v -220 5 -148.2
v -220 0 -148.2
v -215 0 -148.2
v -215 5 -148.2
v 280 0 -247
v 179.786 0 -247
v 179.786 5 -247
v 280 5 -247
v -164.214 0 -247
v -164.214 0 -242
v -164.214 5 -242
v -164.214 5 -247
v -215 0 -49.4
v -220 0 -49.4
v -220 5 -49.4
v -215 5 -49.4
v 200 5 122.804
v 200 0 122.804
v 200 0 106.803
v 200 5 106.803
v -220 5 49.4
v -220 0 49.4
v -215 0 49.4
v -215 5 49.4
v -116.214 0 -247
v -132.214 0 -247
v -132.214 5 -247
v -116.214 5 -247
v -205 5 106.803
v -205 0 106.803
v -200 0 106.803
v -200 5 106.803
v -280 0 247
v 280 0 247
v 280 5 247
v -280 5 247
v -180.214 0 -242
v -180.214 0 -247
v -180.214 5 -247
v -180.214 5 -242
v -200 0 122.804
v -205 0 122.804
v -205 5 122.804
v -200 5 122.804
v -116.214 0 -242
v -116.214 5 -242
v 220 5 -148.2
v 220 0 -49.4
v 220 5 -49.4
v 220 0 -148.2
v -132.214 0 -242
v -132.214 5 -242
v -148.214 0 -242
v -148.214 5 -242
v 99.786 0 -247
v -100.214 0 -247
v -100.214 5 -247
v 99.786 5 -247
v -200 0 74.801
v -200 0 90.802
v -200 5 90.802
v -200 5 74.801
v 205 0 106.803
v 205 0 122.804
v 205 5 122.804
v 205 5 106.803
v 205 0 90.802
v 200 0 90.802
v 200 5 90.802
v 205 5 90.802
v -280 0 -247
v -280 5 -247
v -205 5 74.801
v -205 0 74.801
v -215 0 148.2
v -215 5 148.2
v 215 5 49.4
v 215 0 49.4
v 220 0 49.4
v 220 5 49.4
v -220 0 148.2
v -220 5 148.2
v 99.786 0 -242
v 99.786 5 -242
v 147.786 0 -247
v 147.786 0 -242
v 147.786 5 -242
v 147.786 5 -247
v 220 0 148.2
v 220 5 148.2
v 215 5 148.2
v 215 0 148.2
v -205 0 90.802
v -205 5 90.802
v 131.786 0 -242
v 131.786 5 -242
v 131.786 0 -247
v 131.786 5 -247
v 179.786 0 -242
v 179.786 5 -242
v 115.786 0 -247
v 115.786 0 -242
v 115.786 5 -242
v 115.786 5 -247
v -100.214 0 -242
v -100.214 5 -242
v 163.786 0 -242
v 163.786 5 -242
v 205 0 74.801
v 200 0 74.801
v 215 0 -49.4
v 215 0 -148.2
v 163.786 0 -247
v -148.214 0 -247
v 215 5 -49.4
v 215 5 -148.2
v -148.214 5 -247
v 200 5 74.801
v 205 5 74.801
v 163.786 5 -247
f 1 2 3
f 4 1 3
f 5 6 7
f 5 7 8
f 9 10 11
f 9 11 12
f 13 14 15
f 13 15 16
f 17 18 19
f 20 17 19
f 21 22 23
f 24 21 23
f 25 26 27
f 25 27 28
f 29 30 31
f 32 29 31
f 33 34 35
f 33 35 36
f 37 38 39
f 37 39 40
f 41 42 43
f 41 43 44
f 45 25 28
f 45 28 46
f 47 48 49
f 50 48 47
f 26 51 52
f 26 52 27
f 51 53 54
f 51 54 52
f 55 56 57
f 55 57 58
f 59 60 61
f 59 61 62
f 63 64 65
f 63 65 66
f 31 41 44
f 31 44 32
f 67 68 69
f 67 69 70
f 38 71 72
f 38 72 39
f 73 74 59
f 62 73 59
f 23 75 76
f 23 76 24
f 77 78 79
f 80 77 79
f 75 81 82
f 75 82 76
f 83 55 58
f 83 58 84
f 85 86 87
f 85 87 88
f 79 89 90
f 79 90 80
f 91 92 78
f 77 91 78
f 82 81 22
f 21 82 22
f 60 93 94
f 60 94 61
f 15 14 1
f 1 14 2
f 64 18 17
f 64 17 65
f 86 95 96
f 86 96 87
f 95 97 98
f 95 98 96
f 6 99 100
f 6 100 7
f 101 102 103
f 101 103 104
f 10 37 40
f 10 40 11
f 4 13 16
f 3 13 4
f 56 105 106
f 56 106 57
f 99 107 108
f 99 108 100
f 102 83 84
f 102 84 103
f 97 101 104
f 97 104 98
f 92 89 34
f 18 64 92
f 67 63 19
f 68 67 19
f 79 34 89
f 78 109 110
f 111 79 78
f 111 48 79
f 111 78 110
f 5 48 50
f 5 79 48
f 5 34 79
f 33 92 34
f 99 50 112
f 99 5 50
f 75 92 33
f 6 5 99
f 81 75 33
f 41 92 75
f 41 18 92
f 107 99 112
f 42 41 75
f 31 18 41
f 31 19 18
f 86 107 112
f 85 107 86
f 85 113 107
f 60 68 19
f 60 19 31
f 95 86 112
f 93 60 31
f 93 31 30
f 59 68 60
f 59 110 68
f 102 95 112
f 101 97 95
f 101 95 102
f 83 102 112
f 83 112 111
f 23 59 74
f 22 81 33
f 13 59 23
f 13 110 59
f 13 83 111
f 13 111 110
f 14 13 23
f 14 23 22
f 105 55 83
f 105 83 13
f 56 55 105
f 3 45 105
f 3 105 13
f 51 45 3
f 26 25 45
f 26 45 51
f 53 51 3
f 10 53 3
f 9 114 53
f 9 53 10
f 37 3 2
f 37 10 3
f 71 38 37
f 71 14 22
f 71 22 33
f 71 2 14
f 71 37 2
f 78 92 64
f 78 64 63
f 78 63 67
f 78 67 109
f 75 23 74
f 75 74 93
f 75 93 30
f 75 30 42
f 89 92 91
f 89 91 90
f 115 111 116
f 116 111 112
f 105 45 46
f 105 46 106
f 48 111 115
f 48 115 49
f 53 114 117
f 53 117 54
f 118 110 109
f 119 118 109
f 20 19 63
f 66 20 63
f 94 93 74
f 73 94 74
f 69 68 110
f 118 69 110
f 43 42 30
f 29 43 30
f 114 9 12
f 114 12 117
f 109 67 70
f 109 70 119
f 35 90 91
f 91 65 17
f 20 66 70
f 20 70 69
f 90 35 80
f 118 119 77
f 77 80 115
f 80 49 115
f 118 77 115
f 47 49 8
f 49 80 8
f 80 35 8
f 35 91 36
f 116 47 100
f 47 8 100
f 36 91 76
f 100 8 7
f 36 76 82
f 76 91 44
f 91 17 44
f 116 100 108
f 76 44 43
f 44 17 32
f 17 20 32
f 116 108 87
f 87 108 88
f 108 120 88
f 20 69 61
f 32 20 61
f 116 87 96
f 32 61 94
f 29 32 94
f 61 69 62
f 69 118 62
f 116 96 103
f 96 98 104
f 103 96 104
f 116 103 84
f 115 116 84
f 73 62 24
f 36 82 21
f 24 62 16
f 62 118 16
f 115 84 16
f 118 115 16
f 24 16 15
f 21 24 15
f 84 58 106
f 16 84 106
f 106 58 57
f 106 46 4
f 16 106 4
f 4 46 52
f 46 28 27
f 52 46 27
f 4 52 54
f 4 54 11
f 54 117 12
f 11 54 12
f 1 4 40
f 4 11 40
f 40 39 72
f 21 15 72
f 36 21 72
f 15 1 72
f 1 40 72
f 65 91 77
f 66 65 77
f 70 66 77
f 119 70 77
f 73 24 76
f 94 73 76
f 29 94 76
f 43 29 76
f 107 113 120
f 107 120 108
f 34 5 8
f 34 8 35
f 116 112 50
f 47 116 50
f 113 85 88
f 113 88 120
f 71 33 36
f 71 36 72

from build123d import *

# Parameters (mm, degrees)
SKETCH1_W           = 5
SKETCH1_H           = 98.8
SKETCH1_H_2         = 16.000962119
BOSS_EXTRUDE1_DEPTH = 5


with BuildPart() as part:
    # Sketch1 → Boss-Extrude1 (new body)
    with BuildSketch(Plane(origin=(0, 0, 0), x_dir=(1, 0, 0), z_dir=(0, 1, 0))):
        Polygon((-280, 247), (-180.213569057, 247), (-180.213569057, 242), (-164.213569057, 242), (-164.213569057, 247), (-148.213569057, 247), (-148.213569057, 242), (-132.213569057, 242), (-132.213569057, 247), (-116.213569057, 247), (-116.213569057, 242), (-100.213569057, 242), (-100.213569057, 247), (99.786430943, 247), (99.786430943, 242), (115.786430943, 242), (115.786430943, 247), (131.786430943, 247), (131.786430943, 242), (147.786430943, 242), (147.786430943, 247), (163.786430943, 247), (163.786430943, 242), (179.786430943, 242), (179.786430943, 247), (280, 247), (280, -247), (-280, -247), align=None)
        with Locations((-217.5, -98.8)):
            Rectangle(SKETCH1_W, SKETCH1_H, mode=Mode.SUBTRACT)
        with Locations((217.5, -98.8)):
            Rectangle(SKETCH1_W, SKETCH1_H, mode=Mode.SUBTRACT)
        with Locations((-202.5, -82.801443178)):
            Rectangle(SKETCH1_W, SKETCH1_H_2, mode=Mode.SUBTRACT)
        with Locations((217.5, 98.8)):
            Rectangle(SKETCH1_W, SKETCH1_H, mode=Mode.SUBTRACT)
        with Locations((-217.5, 98.8)):
            Rectangle(SKETCH1_W, SKETCH1_H, mode=Mode.SUBTRACT)
        with Locations((202.5, -114.803367415)):
            Rectangle(SKETCH1_W, SKETCH1_H_2, mode=Mode.SUBTRACT)
        with Locations((202.5, -82.801443178)):
            Rectangle(SKETCH1_W, SKETCH1_H_2, mode=Mode.SUBTRACT)
        with Locations((-202.5, -114.803367415)):
            Rectangle(SKETCH1_W, SKETCH1_H_2, mode=Mode.SUBTRACT)
    extrude(amount=BOSS_EXTRUDE1_DEPTH)


solid = part.part
